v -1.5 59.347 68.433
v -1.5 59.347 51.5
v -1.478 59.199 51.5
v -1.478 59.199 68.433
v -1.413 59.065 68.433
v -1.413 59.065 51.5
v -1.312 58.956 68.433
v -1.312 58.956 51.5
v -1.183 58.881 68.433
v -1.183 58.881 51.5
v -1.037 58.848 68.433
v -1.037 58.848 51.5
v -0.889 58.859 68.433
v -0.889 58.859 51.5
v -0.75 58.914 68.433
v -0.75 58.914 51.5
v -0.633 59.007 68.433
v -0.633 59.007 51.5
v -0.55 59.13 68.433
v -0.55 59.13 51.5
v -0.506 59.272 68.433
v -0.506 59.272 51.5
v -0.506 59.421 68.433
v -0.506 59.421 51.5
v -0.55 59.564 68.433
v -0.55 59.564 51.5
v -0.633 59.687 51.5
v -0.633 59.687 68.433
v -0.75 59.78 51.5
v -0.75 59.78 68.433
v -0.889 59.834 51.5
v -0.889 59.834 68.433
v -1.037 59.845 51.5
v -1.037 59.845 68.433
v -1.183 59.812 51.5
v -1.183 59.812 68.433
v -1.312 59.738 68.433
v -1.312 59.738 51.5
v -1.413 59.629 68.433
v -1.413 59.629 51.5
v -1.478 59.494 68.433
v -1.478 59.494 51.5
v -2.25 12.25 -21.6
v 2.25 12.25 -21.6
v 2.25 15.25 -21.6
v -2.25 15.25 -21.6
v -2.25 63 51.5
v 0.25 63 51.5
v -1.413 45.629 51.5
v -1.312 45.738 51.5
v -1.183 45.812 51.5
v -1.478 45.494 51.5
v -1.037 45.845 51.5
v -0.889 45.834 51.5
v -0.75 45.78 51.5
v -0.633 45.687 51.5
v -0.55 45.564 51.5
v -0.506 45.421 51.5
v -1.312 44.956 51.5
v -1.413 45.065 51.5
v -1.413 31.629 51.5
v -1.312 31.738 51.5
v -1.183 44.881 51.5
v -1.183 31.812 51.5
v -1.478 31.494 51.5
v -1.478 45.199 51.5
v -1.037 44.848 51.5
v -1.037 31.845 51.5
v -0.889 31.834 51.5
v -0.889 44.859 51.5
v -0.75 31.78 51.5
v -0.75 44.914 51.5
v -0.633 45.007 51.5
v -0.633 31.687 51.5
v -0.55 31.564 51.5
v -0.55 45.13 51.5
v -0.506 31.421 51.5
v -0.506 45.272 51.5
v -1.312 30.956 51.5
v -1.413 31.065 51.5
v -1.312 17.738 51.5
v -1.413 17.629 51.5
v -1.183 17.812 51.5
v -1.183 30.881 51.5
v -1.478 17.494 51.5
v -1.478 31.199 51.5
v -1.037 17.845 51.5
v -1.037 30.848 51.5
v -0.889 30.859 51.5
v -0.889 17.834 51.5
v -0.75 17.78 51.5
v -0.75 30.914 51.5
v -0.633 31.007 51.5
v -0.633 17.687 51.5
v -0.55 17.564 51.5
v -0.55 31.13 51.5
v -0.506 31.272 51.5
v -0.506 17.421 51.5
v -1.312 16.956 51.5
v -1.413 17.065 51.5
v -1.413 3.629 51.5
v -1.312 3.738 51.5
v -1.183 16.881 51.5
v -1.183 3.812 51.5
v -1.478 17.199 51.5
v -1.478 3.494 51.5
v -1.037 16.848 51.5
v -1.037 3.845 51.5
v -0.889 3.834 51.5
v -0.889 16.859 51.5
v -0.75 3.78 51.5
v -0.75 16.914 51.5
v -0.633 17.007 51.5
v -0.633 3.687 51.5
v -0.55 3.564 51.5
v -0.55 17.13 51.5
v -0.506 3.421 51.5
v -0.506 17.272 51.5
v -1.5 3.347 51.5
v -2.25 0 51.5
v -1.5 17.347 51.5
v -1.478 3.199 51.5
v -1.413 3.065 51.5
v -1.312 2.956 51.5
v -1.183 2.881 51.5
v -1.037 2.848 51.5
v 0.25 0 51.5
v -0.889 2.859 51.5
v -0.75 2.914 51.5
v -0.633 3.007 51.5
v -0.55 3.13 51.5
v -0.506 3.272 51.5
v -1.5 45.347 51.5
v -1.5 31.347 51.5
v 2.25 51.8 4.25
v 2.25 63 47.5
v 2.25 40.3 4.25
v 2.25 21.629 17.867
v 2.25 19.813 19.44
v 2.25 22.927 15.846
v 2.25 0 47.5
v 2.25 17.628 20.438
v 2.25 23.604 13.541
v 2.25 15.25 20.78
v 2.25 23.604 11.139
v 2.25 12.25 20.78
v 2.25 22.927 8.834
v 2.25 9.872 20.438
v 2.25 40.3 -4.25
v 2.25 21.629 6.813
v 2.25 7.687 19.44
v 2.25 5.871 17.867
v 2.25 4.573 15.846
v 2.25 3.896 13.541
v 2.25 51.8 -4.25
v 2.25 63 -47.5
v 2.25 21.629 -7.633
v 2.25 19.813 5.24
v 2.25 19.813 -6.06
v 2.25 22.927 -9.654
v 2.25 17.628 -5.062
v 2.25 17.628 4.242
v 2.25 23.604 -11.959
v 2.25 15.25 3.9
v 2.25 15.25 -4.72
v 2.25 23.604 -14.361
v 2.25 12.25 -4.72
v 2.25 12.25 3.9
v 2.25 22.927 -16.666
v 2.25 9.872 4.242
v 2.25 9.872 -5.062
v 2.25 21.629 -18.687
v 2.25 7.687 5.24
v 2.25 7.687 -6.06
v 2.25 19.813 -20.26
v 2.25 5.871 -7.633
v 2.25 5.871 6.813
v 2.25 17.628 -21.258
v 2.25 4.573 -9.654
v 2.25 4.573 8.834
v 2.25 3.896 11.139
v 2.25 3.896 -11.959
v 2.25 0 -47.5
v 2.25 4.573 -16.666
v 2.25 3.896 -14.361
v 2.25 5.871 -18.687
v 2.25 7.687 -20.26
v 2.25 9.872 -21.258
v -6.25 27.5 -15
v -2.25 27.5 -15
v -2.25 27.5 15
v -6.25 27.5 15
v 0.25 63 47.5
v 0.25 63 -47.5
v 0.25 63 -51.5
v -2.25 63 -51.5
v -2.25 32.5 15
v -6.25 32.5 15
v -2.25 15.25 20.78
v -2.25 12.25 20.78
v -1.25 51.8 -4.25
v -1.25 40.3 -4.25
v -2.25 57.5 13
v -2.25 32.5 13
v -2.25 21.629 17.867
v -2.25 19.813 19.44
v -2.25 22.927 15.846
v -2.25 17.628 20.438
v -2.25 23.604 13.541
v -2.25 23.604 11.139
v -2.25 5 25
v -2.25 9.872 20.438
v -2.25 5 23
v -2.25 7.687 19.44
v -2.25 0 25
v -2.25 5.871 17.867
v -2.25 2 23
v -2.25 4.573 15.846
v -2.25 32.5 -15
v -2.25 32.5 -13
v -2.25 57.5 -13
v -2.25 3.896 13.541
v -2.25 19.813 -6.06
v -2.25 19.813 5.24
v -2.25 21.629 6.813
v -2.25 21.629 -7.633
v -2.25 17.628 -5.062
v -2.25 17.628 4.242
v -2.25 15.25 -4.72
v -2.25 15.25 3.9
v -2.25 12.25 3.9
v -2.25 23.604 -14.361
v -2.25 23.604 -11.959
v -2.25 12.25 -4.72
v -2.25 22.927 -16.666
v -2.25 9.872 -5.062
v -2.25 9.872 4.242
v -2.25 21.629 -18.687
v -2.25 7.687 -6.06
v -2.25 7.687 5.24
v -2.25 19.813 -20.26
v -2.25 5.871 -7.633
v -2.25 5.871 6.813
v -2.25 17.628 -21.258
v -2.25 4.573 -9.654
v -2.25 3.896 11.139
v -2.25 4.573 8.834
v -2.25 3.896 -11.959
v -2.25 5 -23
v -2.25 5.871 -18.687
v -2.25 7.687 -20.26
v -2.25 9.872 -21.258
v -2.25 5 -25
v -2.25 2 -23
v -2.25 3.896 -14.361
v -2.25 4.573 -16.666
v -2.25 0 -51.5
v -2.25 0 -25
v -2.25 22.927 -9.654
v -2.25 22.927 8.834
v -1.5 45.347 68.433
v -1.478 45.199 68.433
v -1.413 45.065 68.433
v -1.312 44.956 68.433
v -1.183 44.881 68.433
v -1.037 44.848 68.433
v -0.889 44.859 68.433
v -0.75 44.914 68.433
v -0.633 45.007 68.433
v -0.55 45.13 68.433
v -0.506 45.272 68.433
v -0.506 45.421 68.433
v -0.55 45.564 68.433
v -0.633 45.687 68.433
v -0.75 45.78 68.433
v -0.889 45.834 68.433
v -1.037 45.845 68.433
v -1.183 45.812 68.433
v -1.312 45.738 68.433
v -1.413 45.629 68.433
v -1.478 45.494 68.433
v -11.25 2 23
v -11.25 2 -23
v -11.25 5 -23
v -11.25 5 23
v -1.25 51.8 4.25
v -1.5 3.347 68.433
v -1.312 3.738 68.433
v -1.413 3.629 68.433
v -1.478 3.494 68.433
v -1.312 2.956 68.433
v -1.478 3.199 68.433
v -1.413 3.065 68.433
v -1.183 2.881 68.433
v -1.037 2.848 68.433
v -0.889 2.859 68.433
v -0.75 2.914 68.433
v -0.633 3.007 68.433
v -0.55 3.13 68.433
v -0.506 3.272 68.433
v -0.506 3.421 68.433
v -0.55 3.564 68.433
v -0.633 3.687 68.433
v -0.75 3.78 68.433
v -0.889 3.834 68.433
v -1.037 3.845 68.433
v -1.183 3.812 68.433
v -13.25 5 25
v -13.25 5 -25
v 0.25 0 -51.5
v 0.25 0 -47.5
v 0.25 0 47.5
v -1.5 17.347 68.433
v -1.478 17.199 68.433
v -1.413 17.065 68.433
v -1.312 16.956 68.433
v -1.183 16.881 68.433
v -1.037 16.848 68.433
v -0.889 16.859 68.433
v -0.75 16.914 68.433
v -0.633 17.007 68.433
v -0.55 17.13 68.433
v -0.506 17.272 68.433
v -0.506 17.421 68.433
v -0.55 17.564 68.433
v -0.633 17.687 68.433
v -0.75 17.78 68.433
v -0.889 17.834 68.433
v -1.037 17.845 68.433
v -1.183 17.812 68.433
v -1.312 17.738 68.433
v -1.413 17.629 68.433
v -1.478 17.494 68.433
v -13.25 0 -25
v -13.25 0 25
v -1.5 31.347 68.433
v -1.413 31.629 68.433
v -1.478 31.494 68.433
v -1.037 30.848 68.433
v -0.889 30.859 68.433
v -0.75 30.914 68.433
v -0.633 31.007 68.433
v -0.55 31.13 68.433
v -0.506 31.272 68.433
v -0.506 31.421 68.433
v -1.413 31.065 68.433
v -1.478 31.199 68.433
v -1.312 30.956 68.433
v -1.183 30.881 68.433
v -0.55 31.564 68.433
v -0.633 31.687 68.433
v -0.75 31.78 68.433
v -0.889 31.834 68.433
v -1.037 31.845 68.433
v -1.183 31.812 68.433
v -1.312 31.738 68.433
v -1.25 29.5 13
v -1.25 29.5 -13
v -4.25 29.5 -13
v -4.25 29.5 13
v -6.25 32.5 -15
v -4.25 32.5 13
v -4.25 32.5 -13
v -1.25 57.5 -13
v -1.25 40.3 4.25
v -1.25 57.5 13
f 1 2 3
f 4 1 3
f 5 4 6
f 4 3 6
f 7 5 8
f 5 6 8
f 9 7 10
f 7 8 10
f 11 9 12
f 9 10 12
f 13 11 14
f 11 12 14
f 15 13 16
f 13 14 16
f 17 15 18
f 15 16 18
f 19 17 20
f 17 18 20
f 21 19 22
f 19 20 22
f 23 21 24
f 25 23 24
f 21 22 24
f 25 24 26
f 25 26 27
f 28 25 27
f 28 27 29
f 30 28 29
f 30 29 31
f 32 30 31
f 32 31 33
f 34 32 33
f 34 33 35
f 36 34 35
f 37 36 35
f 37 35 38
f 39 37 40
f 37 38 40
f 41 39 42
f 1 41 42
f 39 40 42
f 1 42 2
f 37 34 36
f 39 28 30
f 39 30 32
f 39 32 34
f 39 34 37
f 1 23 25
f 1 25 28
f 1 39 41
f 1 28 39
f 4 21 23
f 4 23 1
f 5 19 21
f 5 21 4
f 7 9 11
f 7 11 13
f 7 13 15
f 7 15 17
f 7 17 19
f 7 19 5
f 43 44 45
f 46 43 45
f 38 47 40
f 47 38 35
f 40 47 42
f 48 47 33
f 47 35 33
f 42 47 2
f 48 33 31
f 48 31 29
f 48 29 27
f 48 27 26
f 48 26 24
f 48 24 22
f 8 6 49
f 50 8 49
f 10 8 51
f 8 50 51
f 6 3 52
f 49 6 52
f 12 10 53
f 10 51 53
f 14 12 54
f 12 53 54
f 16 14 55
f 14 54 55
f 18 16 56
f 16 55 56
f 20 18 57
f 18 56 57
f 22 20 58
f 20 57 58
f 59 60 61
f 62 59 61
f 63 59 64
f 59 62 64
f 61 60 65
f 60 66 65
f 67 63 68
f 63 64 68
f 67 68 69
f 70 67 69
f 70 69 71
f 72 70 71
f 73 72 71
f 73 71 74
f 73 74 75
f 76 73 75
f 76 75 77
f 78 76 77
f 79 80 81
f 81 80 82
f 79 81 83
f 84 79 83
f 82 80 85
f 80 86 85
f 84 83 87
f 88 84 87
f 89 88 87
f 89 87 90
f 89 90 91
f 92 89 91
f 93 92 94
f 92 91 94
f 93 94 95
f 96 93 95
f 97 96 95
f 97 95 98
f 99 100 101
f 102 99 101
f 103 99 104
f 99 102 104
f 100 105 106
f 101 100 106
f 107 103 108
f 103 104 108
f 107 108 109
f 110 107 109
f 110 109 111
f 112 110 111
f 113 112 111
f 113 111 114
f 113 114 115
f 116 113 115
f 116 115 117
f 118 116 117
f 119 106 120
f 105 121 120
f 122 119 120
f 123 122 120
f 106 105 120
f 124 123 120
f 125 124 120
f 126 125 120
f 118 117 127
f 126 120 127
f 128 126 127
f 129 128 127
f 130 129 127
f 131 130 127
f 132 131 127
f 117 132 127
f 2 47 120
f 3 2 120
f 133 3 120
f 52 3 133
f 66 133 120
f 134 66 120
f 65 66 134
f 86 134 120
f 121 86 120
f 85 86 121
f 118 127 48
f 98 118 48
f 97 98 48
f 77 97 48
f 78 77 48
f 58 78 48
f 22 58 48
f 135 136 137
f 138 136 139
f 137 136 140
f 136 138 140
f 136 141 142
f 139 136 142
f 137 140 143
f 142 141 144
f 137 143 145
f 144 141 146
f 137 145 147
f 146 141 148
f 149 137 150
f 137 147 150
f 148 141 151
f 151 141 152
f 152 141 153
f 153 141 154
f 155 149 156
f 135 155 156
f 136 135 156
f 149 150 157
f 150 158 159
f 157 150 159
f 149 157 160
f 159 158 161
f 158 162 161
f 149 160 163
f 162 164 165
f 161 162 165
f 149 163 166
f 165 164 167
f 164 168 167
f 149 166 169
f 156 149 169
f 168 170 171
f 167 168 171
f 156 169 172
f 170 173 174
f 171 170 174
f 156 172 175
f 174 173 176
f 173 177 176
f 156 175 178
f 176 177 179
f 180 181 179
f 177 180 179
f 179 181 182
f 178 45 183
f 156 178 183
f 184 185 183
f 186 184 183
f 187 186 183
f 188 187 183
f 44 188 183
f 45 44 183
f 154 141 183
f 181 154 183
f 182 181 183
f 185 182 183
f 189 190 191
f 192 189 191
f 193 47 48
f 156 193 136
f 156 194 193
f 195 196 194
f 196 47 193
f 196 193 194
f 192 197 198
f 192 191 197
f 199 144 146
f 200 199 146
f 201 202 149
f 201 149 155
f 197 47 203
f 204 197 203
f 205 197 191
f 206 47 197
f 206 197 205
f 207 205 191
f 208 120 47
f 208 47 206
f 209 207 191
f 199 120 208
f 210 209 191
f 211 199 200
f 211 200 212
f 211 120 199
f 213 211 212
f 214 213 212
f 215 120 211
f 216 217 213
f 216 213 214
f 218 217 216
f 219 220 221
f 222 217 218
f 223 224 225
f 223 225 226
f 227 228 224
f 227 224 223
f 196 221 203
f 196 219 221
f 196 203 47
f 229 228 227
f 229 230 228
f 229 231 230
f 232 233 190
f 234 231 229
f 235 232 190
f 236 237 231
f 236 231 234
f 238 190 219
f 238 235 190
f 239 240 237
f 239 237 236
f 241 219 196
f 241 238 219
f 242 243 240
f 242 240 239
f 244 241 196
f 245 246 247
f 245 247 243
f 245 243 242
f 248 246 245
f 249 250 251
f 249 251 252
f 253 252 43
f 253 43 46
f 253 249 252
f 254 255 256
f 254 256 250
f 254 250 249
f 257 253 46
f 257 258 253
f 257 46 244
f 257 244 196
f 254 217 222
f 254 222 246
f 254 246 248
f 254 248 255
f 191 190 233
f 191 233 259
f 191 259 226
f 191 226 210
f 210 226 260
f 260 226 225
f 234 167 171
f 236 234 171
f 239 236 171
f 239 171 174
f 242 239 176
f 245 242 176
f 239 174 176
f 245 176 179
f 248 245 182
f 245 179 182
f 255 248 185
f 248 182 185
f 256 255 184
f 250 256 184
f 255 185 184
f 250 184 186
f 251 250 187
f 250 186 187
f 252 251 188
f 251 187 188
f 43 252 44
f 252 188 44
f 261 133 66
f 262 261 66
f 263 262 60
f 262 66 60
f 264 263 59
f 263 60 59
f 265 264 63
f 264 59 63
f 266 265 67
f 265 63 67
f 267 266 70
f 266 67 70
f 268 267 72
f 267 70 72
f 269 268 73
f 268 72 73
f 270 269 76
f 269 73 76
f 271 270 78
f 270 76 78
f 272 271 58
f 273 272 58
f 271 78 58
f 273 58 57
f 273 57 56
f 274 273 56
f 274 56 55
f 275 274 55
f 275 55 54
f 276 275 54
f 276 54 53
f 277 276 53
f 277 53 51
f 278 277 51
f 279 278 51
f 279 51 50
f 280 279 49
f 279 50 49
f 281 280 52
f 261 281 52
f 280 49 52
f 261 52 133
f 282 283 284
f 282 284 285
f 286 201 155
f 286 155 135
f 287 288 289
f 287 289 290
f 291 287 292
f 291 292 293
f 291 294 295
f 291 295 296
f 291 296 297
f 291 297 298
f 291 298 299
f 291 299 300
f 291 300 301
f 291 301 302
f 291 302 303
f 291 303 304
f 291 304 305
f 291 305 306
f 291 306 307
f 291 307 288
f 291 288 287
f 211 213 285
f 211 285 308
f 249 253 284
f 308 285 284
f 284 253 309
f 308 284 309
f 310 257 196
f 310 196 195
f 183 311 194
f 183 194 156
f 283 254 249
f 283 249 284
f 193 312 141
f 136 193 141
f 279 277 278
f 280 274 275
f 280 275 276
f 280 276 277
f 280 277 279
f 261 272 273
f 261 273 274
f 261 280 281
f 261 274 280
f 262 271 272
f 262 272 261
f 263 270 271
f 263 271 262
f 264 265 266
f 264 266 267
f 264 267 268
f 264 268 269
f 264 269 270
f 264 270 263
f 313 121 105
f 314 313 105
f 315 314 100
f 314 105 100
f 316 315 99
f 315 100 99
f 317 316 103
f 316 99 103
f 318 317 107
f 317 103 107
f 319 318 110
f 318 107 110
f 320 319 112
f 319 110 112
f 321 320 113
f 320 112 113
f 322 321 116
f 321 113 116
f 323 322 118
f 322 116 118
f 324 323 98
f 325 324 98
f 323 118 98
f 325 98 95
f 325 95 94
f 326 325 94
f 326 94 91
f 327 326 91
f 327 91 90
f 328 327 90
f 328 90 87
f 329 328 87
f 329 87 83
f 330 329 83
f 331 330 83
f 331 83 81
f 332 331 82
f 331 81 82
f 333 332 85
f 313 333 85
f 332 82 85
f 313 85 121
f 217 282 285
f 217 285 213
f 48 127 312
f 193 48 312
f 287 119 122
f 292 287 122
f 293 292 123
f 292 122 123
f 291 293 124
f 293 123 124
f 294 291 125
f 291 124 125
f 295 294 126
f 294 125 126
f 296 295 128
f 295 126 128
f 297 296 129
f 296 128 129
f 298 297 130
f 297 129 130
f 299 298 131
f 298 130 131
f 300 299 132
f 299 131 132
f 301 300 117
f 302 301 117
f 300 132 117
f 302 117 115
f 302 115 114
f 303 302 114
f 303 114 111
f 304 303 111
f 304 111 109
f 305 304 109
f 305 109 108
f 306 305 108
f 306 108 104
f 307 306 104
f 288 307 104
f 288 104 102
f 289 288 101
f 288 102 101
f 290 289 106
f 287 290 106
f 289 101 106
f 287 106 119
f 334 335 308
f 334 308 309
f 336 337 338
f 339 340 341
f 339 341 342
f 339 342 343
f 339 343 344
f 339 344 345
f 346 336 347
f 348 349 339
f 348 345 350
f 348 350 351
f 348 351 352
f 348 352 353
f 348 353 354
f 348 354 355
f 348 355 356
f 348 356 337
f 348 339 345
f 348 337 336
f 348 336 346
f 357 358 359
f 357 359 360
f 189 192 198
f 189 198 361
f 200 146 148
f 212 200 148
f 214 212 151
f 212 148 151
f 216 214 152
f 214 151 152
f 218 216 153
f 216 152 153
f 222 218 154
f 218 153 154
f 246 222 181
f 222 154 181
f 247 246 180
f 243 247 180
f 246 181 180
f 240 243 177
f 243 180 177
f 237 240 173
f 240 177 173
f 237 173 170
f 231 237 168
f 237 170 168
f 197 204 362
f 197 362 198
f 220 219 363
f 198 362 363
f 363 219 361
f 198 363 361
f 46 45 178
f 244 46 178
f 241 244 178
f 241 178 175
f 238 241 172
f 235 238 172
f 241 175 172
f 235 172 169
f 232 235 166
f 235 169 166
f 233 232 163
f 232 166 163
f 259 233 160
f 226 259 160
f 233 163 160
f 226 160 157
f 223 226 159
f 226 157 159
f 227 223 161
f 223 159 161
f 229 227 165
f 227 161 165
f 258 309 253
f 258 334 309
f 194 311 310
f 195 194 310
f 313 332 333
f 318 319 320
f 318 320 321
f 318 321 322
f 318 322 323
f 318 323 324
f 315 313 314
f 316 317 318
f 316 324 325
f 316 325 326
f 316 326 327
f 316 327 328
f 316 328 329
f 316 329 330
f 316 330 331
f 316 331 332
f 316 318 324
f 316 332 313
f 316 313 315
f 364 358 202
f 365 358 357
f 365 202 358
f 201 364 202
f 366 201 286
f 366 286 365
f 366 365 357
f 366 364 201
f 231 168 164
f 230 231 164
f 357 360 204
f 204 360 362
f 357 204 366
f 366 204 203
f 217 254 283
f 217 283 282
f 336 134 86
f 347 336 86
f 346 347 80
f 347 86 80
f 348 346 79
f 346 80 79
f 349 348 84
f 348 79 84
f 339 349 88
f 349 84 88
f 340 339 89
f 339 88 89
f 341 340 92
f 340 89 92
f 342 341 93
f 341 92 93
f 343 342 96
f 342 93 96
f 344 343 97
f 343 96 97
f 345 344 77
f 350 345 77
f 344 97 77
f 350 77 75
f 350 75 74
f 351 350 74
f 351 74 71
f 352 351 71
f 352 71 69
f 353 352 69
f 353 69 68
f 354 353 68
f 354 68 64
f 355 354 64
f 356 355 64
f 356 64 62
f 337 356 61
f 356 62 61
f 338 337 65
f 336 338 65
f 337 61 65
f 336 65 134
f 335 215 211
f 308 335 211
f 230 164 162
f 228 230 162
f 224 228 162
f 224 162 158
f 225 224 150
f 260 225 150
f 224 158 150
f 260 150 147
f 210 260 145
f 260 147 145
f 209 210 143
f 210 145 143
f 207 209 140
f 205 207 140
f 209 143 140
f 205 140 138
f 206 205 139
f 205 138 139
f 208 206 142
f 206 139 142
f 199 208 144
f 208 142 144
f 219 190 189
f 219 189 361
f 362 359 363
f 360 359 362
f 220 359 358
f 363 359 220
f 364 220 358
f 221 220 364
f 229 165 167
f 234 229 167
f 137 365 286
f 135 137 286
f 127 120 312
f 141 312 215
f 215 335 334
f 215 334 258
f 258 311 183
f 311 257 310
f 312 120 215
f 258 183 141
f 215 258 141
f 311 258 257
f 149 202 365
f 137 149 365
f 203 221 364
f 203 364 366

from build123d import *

# Parameters (mm, degrees)
SKETCH_1_W          = 2.5
SKETCH_1_H          = 103
SKETCH_1_W_2        = 2
SKETCH_1_H_2        = 95
EXTRUDE_1_DEPTH     = 63
SKETCH_5_W          = 50
SKETCH_5_H          = 2
EXTRUDE_2_DEPTH     = 11
EXTRUDE_3_DEPTH     = 3
CUT_EXTRUDE_1_DEPTH = 4.5
SKETCH_11_W         = 8.5
SKETCH_11_H         = 11.5
CUT_EXTRUDE_2_DEPTH = 4.5
SKETCH_12_W         = 26
SKETCH_12_H         = 28
SKETCH_12_W_2       = 25
SKETCH_12_H_2       = 27
SKETCH_12_W_3       = 8.5
SKETCH_12_H_3       = 11.5
CUT_EXTRUDE_3_DEPTH = 1
SKETCH_13_W         = 30
SKETCH_13_H         = 2
EXTRUDE_4_DEPTH     = 4
EXTRUDE_5_DEPTH     = 3
SKETCH_15_R         = 0.5
EXTRUDE_6_DEPTH     = 16.933321459


with BuildPart() as part:
    # 스케치1 → 보스-돌출1 (new body)
    with BuildSketch(Plane(origin=(0, 0, 0), x_dir=(1, 0, 0), z_dir=(0, 1, 0))):
        with Locations((-1, 0)):
            Rectangle(SKETCH_1_W, SKETCH_1_H)
        with Locations((1.25, 0)):
            Rectangle(SKETCH_1_W_2, SKETCH_1_H_2)
    extrude(amount=EXTRUDE_1_DEPTH)

    # 스케치5 → 보스-돌출2 (add)
    with BuildSketch(Plane.ZY.offset(2.25)):
        with Locations((0, 1)):
            Rectangle(SKETCH_5_W, SKETCH_5_H)
    extrude(amount=EXTRUDE_2_DEPTH)

    # 스케치7 → 보스-돌출3 (add)
    with BuildSketch(Plane(origin=(0, 2, 0), x_dir=(1, 0, 0), z_dir=(0, 1, 0))):
        Polygon((-2.25, 23), (-11.25, 23), (-11.25, -23), (-2.25, -23), (-2.25, -25), (-13.25, -25), (-13.25, 25), (-2.25, 25), align=None)
    extrude(amount=EXTRUDE_3_DEPTH)

    # 스케치10 → 컷-돌출1 (cut)
    with BuildSketch(Plane(origin=(2.25, 0, 0), x_dir=(0, 0, -1), z_dir=(1, 0, 0))):
        with BuildLine():
            Line((-20.78, 15.25), (-20.78, 12.25))
            ThreePointArc((-20.78, 12.25), (-12.34, 3.81), (-3.9, 12.25))
            Line((-3.9, 12.25), (-3.9, 15.25))
            ThreePointArc((-3.9, 15.25), (-12.34, 23.69), (-20.78, 15.25))
        make_face()
        with BuildLine():
            Line((4.72, 15.25), (4.72, 12.25))
            ThreePointArc((4.72, 12.25), (13.16, 3.81), (21.6, 12.25))
            Line((21.6, 12.25), (21.6, 15.25))
            ThreePointArc((21.6, 15.25), (13.16, 23.69), (4.72, 15.25))
        make_face()
    extrude(amount=-CUT_EXTRUDE_1_DEPTH, mode=Mode.SUBTRACT)

    # 스케치11 → 컷-돌출2 (cut)
    with BuildSketch(Plane.ZY.offset(2.25)):
        with Locations((0, 46.05)):
            Rectangle(SKETCH_11_W, SKETCH_11_H)
    extrude(amount=-CUT_EXTRUDE_2_DEPTH, mode=Mode.SUBTRACT)

    # 스케치12 → 컷-돌출3 (cut)
    # profile 1 of 2: a face of its own
    with BuildSketch(Plane.ZY.offset(2.25)):
        with Locations((0, 43.5)):
            Rectangle(SKETCH_12_W, SKETCH_12_H)
        with Locations((0, 43.5)):
            Rectangle(SKETCH_12_W_2, SKETCH_12_H_2, mode=Mode.SUBTRACT)
    # profile 2 of 2: a face of its own
    with BuildSketch(Plane.ZY.offset(2.25)):
        with Locations((0, 43.5)):
            Rectangle(SKETCH_12_W_2, SKETCH_12_H_2)
        with Locations((0, 46.05)):
            Rectangle(SKETCH_12_W_3, SKETCH_12_H_3, mode=Mode.SUBTRACT)
    extrude(amount=-CUT_EXTRUDE_3_DEPTH, mode=Mode.SUBTRACT)

    # 스케치13 → 보스-돌출4 (add)
    with BuildSketch(Plane.ZY.offset(2.25)):
        with Locations((0, 28.5)):
            Rectangle(SKETCH_13_W, SKETCH_13_H)
    extrude(amount=EXTRUDE_4_DEPTH)

    # 스케치14 → 보스-돌출5 (add)
    with BuildSketch(Plane(origin=(0, 29.5, 0), x_dir=(1, 0, 0), z_dir=(0, 1, 0))):
        Polygon((-2.25, -13), (-2.25, -15), (-6.25, -15), (-6.25, 15), (-2.25, 15), (-2.25, 13), (-4.25, 13), (-4.25, -13), align=None)
    extrude(amount=EXTRUDE_5_DEPTH)

    # 스케치15 → 보스-돌출6 (add)
    with BuildSketch(Plane.XY.offset(51.5)):
        with Locations(Location((-1, 3.34687428, 0), (0, 0, 180))):
            Circle(SKETCH_15_R)
        with Locations(Location((-1, 17.34687428, 0), (0, 0, 180))):
            Circle(SKETCH_15_R)
        with Locations(Location((-1, 31.34687428, 0), (0, 0, 180))):
            Circle(SKETCH_15_R)
        with Locations(Location((-1, 45.34687428, 0), (0, 0, 180))):
            Circle(SKETCH_15_R)
        with Locations(Location((-1, 59.34687428, 0), (0, 0, 180))):
            Circle(SKETCH_15_R)
    extrude(amount=EXTRUDE_6_DEPTH)


solid = part.part
